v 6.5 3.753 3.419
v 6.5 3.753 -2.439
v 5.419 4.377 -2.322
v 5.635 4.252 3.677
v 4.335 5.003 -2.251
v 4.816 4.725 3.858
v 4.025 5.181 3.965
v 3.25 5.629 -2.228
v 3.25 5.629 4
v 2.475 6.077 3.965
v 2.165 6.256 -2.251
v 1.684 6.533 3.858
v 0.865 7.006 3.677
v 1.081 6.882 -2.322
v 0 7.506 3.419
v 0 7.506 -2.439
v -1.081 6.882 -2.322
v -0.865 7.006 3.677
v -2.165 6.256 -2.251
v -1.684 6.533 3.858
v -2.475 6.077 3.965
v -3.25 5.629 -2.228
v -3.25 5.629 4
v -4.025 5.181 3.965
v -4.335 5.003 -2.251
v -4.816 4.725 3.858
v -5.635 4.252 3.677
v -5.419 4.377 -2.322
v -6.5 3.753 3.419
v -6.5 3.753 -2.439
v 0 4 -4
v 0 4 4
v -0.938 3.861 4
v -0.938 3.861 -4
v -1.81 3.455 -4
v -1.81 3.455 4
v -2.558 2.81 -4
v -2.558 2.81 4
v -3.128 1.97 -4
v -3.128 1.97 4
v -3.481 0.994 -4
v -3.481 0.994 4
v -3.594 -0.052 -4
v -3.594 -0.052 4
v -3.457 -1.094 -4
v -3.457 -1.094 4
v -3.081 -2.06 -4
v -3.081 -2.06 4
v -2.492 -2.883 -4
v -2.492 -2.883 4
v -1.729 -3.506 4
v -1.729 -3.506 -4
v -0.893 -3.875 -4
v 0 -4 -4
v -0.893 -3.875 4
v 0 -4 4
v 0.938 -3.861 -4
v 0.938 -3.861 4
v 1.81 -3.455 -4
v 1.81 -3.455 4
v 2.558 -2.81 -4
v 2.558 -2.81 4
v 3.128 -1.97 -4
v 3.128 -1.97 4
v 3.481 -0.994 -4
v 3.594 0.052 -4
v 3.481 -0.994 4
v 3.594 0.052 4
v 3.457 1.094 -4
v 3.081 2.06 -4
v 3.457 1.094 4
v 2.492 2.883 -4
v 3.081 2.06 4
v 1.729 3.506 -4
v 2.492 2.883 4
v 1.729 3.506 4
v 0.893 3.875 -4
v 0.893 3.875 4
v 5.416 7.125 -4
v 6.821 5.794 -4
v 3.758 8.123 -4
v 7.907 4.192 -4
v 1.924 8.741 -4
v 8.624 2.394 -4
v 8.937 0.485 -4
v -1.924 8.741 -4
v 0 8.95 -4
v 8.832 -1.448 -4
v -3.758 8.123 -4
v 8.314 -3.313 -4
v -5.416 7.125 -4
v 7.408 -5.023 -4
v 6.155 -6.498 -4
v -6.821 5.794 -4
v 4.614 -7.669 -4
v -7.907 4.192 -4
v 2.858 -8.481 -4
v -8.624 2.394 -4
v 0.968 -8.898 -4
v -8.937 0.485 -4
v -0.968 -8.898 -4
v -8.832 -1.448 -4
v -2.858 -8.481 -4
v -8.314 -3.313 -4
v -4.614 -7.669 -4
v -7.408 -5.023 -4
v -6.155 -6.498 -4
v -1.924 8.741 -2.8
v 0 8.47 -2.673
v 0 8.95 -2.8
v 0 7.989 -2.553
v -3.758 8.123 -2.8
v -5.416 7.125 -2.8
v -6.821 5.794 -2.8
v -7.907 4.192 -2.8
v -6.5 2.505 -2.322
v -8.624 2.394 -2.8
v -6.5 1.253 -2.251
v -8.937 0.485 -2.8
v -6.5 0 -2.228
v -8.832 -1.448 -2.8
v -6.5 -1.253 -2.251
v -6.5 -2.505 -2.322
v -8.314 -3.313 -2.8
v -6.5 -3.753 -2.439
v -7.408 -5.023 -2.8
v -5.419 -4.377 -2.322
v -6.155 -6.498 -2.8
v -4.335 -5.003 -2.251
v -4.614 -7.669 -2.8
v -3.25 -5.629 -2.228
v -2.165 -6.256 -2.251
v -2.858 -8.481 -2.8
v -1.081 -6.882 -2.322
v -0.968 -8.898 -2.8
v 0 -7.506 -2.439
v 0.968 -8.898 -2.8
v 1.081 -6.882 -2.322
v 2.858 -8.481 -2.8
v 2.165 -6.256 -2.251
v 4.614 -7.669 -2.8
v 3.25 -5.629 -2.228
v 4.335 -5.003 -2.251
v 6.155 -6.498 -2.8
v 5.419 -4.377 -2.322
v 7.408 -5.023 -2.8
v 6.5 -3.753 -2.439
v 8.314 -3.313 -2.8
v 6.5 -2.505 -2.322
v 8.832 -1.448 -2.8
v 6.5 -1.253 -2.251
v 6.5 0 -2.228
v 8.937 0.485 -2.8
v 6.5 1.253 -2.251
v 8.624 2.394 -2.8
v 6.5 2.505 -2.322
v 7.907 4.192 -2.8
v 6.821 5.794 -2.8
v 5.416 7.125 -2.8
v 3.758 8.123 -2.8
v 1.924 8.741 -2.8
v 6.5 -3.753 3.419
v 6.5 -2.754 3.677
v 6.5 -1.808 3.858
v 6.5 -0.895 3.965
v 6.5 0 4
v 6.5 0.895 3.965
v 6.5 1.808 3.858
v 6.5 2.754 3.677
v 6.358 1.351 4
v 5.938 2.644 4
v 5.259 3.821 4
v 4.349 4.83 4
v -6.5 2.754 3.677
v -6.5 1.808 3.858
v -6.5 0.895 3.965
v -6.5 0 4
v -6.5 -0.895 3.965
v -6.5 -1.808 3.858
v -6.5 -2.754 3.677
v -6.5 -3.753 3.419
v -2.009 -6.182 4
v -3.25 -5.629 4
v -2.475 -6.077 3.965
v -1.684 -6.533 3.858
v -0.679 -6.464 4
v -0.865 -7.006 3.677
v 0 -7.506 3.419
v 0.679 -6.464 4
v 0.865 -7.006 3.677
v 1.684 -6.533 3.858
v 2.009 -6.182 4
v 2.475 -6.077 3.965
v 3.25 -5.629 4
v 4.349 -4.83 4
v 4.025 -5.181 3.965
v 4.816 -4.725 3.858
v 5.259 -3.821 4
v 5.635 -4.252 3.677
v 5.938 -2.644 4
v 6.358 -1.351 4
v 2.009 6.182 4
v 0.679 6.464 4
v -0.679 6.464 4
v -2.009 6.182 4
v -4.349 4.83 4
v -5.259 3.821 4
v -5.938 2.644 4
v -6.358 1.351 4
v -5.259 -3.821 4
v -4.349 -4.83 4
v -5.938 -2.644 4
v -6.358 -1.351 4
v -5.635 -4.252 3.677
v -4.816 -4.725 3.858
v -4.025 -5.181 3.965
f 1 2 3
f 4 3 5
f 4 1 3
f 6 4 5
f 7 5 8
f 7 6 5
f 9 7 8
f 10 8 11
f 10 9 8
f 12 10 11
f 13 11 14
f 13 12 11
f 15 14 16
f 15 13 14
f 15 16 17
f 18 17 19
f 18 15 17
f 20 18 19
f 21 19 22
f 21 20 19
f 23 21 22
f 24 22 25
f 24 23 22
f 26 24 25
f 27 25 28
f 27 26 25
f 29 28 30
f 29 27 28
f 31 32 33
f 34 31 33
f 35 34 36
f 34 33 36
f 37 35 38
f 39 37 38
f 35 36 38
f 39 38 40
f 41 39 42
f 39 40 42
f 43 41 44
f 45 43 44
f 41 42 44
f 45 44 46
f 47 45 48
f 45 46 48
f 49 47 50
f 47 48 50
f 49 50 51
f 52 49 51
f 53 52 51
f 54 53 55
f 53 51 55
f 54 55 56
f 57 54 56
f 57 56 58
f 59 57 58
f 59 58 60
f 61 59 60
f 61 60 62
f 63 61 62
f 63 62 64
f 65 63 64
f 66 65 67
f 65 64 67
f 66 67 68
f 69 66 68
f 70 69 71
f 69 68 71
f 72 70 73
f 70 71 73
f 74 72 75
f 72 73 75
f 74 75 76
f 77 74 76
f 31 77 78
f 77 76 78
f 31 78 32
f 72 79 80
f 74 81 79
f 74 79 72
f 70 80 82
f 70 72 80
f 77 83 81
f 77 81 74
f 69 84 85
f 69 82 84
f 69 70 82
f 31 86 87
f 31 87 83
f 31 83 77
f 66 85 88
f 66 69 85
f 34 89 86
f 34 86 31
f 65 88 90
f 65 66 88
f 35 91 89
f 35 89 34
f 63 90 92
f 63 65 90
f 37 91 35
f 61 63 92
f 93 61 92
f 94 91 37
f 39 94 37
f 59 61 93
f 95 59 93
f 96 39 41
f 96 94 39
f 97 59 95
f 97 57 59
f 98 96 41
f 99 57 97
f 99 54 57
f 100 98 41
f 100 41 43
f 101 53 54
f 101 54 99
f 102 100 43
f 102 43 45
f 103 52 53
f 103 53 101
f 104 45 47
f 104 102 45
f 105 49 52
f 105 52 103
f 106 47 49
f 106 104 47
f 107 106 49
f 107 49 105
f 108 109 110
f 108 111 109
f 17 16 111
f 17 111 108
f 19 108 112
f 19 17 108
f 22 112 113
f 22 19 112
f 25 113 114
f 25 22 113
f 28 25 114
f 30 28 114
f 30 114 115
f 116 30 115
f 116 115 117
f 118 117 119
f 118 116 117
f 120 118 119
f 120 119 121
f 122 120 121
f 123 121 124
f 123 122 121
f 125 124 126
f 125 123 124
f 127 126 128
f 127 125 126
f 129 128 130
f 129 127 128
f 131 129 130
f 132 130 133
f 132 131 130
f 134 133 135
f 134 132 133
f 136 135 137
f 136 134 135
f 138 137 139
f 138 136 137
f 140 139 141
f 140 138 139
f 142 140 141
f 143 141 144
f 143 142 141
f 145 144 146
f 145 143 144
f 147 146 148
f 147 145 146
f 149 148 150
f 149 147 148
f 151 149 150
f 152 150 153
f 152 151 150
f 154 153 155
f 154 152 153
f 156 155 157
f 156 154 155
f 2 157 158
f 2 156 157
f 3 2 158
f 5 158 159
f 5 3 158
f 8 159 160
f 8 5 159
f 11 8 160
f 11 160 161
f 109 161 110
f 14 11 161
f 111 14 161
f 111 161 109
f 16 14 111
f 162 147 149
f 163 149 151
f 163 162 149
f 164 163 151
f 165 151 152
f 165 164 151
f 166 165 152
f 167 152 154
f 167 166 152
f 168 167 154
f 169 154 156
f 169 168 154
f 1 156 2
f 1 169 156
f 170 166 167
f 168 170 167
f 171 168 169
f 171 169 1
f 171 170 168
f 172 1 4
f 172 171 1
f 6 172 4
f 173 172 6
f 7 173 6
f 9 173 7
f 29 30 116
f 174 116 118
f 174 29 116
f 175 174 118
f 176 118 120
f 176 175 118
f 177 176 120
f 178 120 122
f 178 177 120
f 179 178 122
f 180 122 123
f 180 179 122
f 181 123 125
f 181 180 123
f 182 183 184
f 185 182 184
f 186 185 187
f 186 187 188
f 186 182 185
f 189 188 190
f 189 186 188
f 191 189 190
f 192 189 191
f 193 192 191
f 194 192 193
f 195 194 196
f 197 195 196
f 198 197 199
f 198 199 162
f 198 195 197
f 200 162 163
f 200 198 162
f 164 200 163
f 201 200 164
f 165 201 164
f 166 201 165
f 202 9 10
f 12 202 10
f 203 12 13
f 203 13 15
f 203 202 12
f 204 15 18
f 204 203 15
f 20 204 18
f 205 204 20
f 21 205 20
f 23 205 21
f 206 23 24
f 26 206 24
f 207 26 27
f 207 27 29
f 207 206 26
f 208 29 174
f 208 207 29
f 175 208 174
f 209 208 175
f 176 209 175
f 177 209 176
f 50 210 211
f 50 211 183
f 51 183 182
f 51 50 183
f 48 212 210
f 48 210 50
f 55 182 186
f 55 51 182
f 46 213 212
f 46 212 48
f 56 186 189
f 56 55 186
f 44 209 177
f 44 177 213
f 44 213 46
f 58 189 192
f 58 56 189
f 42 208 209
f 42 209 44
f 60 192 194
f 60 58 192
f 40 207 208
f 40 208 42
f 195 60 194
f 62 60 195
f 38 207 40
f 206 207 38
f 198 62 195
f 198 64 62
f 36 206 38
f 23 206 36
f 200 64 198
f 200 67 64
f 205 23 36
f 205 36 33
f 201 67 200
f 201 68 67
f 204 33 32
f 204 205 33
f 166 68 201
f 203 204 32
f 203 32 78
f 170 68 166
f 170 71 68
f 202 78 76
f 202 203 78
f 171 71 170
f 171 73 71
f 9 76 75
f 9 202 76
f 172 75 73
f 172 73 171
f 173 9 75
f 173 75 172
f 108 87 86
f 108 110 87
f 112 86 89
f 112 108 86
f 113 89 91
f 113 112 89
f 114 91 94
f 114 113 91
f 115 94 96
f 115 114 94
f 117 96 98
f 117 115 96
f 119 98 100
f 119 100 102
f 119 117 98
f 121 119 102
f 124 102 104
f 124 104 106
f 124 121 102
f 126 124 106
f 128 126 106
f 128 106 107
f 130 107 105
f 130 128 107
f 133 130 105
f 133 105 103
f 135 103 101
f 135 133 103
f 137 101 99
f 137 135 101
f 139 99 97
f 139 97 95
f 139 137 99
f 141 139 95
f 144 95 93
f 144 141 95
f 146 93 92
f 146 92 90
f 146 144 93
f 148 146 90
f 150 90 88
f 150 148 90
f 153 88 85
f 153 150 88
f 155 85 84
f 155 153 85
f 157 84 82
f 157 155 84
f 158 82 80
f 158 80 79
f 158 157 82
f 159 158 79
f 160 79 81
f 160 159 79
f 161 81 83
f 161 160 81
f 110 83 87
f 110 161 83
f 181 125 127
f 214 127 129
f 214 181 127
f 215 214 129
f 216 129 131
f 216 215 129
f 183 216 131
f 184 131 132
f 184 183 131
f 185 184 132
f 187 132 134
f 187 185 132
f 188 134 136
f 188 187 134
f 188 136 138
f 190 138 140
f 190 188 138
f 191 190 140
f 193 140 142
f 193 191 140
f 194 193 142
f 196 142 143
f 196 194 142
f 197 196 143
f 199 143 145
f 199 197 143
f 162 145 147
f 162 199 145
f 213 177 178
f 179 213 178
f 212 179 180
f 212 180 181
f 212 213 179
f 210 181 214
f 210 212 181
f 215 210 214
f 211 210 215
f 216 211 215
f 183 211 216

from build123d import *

# Parameters (mm, degrees)
EXTRUDE1_DEPTH      = 4
SKETCH2_OUTSIDE_W   = 80.544
SKETCH2_OUTSIDE_H   = 80.544
SKETCH2_OUTSIDE_R   = 6.5
CUT_EXTRUDE1_DEPTH  = 15.97347655
CUT_EXTRUDE1_DRAFT  = -60
SKETCH5_R           = 4
CUT_EXTRUDE10_DEPTH = 15.97347655
SKETCH16_R          = 6.5
SKETCH16_RX         = 4
SKETCH16_RY         = 3.594050592
EXTRUDE2_DEPTH      = 8


with BuildPart() as part:
    # Sketch1 → Extrude1 (new, symmetric)
    with BuildSketch(Plane.XY):
        Polygon((6.5, -3.75277675), (6.5, 3.75277675), (0, 7.505553499), (-6.5, 3.75277675), (-6.5, -3.75277675), (0, -7.505553499), align=None)
    extrude(amount=EXTRUDE1_DEPTH, both=True)

    # Sketch18 → Revolve1 (revolve)
    with BuildSketch(Plane(origin=(0, 0, 0), x_dir=(0, 0, -1), z_dir=(1, 0, 0))):
        with BuildLine():
            Line((4, 0), (4, 8.95))
            Line((4, 8.95), (2.8, 8.95))
            ThreePointArc((2.8, 8.95), (1.901336288, 4.515044297), (1.6, 0))
            Line((1.6, 0), (4, 0))
        make_face()
    revolve(axis=Axis((0, 0, -4), (0, 0, 1)))


with BuildPart() as cut_extrude1_tool:
    # Sketch2 outside → Cut-Extrude1 (with draft: the straight prism first)
    with BuildSketch(Plane.XY.offset(4)):
        Rectangle(SKETCH2_OUTSIDE_W, SKETCH2_OUTSIDE_H)
        Circle(SKETCH2_OUTSIDE_R, mode=Mode.SUBTRACT)
    extrude(amount=-CUT_EXTRUDE1_DEPTH)
    # Cut-Extrude1: the draft: its side faces are tilted about the plane it starts from
    cut_extrude1_sides = [cut_extrude1_tool.faces().sort_by_distance(p)[0] for p in [
        (0, -40.272, -3.986738275),
        (40.272, 0, -3.986738275),
        (0, 40.272, -3.986738275),
        (-40.272, 0, -3.986738275),
        (-6.5, 0, -3.986738275),
    ]]
    draft(cut_extrude1_sides, Plane.XY.offset(4), CUT_EXTRUDE1_DRAFT)


with BuildPart() as part_1:
    add(part.part)

    # Cut-Extrude1: cut by cut_extrude1_tool
    add(cut_extrude1_tool.part, mode=Mode.SUBTRACT)

    # Sketch5 → Cut-Extrude10 (cut, through all)
    with BuildSketch(Plane(origin=(0, 0, 4), x_dir=(-1, 0, 0), z_dir=(0, 0, -1))):
        Circle(SKETCH5_R)
    extrude(amount=CUT_EXTRUDE10_DEPTH, mode=Mode.SUBTRACT)

    # Sketch16 → Extrude2 (add)
    with BuildSketch(Plane.XY.offset(4)):
        Circle(SKETCH16_R)
        with Locations(Location((0, 0), (0, 0, 90))):
            Ellipse(SKETCH16_RX, SKETCH16_RY, mode=Mode.SUBTRACT)
    extrude(amount=-EXTRUDE2_DEPTH)


solid = part_1.part
